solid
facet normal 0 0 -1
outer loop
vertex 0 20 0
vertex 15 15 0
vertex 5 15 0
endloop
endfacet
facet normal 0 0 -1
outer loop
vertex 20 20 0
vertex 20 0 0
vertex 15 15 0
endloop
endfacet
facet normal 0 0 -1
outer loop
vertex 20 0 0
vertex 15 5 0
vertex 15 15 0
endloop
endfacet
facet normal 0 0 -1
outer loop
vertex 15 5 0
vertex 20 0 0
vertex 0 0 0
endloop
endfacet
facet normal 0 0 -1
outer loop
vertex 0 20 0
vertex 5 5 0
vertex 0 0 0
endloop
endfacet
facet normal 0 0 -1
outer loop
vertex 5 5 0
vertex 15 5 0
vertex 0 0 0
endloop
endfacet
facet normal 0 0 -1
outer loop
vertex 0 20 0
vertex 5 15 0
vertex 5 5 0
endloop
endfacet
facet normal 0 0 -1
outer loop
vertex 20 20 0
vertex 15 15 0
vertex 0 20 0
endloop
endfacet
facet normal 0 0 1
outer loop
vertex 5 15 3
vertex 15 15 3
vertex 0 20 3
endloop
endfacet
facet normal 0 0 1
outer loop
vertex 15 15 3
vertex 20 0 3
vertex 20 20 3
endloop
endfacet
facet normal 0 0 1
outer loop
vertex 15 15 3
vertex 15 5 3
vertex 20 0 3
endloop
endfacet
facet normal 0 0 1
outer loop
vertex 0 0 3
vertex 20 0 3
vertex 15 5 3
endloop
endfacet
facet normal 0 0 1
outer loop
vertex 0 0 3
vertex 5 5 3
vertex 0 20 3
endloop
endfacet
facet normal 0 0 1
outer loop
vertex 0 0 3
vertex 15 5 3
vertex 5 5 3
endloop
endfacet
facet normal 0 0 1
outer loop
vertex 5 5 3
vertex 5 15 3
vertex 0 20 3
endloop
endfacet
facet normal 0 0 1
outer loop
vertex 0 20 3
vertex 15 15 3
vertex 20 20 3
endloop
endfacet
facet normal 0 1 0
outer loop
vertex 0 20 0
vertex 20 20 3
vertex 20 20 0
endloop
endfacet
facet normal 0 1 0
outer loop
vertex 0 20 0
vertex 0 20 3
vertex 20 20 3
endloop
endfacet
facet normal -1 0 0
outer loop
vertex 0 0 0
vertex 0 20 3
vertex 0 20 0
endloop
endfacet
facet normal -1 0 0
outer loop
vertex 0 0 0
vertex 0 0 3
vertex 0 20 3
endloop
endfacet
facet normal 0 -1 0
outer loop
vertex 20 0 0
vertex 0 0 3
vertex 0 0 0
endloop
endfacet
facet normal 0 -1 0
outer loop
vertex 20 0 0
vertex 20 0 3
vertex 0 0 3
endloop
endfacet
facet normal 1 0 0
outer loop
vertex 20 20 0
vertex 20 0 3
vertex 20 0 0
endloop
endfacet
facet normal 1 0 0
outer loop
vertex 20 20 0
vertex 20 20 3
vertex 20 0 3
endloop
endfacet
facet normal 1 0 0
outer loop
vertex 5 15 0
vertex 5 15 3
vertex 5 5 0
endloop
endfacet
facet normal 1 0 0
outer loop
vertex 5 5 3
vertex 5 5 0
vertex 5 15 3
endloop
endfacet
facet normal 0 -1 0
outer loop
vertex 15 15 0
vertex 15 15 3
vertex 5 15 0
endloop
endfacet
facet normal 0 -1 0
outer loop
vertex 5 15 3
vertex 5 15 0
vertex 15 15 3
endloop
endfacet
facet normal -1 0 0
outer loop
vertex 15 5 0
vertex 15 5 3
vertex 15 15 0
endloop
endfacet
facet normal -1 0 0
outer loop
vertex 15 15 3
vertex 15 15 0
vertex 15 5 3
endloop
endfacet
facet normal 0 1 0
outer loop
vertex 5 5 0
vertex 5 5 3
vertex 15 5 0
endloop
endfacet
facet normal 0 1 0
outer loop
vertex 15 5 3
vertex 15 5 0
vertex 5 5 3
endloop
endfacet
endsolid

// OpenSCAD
linear_extrude(3) polygon(points=[[0,0],[20,0],[20,20],[0,20],[5,5],[15,5],[15,15],[5,15]], paths=[[0,1,2,3],[4,5,6,7]]);
